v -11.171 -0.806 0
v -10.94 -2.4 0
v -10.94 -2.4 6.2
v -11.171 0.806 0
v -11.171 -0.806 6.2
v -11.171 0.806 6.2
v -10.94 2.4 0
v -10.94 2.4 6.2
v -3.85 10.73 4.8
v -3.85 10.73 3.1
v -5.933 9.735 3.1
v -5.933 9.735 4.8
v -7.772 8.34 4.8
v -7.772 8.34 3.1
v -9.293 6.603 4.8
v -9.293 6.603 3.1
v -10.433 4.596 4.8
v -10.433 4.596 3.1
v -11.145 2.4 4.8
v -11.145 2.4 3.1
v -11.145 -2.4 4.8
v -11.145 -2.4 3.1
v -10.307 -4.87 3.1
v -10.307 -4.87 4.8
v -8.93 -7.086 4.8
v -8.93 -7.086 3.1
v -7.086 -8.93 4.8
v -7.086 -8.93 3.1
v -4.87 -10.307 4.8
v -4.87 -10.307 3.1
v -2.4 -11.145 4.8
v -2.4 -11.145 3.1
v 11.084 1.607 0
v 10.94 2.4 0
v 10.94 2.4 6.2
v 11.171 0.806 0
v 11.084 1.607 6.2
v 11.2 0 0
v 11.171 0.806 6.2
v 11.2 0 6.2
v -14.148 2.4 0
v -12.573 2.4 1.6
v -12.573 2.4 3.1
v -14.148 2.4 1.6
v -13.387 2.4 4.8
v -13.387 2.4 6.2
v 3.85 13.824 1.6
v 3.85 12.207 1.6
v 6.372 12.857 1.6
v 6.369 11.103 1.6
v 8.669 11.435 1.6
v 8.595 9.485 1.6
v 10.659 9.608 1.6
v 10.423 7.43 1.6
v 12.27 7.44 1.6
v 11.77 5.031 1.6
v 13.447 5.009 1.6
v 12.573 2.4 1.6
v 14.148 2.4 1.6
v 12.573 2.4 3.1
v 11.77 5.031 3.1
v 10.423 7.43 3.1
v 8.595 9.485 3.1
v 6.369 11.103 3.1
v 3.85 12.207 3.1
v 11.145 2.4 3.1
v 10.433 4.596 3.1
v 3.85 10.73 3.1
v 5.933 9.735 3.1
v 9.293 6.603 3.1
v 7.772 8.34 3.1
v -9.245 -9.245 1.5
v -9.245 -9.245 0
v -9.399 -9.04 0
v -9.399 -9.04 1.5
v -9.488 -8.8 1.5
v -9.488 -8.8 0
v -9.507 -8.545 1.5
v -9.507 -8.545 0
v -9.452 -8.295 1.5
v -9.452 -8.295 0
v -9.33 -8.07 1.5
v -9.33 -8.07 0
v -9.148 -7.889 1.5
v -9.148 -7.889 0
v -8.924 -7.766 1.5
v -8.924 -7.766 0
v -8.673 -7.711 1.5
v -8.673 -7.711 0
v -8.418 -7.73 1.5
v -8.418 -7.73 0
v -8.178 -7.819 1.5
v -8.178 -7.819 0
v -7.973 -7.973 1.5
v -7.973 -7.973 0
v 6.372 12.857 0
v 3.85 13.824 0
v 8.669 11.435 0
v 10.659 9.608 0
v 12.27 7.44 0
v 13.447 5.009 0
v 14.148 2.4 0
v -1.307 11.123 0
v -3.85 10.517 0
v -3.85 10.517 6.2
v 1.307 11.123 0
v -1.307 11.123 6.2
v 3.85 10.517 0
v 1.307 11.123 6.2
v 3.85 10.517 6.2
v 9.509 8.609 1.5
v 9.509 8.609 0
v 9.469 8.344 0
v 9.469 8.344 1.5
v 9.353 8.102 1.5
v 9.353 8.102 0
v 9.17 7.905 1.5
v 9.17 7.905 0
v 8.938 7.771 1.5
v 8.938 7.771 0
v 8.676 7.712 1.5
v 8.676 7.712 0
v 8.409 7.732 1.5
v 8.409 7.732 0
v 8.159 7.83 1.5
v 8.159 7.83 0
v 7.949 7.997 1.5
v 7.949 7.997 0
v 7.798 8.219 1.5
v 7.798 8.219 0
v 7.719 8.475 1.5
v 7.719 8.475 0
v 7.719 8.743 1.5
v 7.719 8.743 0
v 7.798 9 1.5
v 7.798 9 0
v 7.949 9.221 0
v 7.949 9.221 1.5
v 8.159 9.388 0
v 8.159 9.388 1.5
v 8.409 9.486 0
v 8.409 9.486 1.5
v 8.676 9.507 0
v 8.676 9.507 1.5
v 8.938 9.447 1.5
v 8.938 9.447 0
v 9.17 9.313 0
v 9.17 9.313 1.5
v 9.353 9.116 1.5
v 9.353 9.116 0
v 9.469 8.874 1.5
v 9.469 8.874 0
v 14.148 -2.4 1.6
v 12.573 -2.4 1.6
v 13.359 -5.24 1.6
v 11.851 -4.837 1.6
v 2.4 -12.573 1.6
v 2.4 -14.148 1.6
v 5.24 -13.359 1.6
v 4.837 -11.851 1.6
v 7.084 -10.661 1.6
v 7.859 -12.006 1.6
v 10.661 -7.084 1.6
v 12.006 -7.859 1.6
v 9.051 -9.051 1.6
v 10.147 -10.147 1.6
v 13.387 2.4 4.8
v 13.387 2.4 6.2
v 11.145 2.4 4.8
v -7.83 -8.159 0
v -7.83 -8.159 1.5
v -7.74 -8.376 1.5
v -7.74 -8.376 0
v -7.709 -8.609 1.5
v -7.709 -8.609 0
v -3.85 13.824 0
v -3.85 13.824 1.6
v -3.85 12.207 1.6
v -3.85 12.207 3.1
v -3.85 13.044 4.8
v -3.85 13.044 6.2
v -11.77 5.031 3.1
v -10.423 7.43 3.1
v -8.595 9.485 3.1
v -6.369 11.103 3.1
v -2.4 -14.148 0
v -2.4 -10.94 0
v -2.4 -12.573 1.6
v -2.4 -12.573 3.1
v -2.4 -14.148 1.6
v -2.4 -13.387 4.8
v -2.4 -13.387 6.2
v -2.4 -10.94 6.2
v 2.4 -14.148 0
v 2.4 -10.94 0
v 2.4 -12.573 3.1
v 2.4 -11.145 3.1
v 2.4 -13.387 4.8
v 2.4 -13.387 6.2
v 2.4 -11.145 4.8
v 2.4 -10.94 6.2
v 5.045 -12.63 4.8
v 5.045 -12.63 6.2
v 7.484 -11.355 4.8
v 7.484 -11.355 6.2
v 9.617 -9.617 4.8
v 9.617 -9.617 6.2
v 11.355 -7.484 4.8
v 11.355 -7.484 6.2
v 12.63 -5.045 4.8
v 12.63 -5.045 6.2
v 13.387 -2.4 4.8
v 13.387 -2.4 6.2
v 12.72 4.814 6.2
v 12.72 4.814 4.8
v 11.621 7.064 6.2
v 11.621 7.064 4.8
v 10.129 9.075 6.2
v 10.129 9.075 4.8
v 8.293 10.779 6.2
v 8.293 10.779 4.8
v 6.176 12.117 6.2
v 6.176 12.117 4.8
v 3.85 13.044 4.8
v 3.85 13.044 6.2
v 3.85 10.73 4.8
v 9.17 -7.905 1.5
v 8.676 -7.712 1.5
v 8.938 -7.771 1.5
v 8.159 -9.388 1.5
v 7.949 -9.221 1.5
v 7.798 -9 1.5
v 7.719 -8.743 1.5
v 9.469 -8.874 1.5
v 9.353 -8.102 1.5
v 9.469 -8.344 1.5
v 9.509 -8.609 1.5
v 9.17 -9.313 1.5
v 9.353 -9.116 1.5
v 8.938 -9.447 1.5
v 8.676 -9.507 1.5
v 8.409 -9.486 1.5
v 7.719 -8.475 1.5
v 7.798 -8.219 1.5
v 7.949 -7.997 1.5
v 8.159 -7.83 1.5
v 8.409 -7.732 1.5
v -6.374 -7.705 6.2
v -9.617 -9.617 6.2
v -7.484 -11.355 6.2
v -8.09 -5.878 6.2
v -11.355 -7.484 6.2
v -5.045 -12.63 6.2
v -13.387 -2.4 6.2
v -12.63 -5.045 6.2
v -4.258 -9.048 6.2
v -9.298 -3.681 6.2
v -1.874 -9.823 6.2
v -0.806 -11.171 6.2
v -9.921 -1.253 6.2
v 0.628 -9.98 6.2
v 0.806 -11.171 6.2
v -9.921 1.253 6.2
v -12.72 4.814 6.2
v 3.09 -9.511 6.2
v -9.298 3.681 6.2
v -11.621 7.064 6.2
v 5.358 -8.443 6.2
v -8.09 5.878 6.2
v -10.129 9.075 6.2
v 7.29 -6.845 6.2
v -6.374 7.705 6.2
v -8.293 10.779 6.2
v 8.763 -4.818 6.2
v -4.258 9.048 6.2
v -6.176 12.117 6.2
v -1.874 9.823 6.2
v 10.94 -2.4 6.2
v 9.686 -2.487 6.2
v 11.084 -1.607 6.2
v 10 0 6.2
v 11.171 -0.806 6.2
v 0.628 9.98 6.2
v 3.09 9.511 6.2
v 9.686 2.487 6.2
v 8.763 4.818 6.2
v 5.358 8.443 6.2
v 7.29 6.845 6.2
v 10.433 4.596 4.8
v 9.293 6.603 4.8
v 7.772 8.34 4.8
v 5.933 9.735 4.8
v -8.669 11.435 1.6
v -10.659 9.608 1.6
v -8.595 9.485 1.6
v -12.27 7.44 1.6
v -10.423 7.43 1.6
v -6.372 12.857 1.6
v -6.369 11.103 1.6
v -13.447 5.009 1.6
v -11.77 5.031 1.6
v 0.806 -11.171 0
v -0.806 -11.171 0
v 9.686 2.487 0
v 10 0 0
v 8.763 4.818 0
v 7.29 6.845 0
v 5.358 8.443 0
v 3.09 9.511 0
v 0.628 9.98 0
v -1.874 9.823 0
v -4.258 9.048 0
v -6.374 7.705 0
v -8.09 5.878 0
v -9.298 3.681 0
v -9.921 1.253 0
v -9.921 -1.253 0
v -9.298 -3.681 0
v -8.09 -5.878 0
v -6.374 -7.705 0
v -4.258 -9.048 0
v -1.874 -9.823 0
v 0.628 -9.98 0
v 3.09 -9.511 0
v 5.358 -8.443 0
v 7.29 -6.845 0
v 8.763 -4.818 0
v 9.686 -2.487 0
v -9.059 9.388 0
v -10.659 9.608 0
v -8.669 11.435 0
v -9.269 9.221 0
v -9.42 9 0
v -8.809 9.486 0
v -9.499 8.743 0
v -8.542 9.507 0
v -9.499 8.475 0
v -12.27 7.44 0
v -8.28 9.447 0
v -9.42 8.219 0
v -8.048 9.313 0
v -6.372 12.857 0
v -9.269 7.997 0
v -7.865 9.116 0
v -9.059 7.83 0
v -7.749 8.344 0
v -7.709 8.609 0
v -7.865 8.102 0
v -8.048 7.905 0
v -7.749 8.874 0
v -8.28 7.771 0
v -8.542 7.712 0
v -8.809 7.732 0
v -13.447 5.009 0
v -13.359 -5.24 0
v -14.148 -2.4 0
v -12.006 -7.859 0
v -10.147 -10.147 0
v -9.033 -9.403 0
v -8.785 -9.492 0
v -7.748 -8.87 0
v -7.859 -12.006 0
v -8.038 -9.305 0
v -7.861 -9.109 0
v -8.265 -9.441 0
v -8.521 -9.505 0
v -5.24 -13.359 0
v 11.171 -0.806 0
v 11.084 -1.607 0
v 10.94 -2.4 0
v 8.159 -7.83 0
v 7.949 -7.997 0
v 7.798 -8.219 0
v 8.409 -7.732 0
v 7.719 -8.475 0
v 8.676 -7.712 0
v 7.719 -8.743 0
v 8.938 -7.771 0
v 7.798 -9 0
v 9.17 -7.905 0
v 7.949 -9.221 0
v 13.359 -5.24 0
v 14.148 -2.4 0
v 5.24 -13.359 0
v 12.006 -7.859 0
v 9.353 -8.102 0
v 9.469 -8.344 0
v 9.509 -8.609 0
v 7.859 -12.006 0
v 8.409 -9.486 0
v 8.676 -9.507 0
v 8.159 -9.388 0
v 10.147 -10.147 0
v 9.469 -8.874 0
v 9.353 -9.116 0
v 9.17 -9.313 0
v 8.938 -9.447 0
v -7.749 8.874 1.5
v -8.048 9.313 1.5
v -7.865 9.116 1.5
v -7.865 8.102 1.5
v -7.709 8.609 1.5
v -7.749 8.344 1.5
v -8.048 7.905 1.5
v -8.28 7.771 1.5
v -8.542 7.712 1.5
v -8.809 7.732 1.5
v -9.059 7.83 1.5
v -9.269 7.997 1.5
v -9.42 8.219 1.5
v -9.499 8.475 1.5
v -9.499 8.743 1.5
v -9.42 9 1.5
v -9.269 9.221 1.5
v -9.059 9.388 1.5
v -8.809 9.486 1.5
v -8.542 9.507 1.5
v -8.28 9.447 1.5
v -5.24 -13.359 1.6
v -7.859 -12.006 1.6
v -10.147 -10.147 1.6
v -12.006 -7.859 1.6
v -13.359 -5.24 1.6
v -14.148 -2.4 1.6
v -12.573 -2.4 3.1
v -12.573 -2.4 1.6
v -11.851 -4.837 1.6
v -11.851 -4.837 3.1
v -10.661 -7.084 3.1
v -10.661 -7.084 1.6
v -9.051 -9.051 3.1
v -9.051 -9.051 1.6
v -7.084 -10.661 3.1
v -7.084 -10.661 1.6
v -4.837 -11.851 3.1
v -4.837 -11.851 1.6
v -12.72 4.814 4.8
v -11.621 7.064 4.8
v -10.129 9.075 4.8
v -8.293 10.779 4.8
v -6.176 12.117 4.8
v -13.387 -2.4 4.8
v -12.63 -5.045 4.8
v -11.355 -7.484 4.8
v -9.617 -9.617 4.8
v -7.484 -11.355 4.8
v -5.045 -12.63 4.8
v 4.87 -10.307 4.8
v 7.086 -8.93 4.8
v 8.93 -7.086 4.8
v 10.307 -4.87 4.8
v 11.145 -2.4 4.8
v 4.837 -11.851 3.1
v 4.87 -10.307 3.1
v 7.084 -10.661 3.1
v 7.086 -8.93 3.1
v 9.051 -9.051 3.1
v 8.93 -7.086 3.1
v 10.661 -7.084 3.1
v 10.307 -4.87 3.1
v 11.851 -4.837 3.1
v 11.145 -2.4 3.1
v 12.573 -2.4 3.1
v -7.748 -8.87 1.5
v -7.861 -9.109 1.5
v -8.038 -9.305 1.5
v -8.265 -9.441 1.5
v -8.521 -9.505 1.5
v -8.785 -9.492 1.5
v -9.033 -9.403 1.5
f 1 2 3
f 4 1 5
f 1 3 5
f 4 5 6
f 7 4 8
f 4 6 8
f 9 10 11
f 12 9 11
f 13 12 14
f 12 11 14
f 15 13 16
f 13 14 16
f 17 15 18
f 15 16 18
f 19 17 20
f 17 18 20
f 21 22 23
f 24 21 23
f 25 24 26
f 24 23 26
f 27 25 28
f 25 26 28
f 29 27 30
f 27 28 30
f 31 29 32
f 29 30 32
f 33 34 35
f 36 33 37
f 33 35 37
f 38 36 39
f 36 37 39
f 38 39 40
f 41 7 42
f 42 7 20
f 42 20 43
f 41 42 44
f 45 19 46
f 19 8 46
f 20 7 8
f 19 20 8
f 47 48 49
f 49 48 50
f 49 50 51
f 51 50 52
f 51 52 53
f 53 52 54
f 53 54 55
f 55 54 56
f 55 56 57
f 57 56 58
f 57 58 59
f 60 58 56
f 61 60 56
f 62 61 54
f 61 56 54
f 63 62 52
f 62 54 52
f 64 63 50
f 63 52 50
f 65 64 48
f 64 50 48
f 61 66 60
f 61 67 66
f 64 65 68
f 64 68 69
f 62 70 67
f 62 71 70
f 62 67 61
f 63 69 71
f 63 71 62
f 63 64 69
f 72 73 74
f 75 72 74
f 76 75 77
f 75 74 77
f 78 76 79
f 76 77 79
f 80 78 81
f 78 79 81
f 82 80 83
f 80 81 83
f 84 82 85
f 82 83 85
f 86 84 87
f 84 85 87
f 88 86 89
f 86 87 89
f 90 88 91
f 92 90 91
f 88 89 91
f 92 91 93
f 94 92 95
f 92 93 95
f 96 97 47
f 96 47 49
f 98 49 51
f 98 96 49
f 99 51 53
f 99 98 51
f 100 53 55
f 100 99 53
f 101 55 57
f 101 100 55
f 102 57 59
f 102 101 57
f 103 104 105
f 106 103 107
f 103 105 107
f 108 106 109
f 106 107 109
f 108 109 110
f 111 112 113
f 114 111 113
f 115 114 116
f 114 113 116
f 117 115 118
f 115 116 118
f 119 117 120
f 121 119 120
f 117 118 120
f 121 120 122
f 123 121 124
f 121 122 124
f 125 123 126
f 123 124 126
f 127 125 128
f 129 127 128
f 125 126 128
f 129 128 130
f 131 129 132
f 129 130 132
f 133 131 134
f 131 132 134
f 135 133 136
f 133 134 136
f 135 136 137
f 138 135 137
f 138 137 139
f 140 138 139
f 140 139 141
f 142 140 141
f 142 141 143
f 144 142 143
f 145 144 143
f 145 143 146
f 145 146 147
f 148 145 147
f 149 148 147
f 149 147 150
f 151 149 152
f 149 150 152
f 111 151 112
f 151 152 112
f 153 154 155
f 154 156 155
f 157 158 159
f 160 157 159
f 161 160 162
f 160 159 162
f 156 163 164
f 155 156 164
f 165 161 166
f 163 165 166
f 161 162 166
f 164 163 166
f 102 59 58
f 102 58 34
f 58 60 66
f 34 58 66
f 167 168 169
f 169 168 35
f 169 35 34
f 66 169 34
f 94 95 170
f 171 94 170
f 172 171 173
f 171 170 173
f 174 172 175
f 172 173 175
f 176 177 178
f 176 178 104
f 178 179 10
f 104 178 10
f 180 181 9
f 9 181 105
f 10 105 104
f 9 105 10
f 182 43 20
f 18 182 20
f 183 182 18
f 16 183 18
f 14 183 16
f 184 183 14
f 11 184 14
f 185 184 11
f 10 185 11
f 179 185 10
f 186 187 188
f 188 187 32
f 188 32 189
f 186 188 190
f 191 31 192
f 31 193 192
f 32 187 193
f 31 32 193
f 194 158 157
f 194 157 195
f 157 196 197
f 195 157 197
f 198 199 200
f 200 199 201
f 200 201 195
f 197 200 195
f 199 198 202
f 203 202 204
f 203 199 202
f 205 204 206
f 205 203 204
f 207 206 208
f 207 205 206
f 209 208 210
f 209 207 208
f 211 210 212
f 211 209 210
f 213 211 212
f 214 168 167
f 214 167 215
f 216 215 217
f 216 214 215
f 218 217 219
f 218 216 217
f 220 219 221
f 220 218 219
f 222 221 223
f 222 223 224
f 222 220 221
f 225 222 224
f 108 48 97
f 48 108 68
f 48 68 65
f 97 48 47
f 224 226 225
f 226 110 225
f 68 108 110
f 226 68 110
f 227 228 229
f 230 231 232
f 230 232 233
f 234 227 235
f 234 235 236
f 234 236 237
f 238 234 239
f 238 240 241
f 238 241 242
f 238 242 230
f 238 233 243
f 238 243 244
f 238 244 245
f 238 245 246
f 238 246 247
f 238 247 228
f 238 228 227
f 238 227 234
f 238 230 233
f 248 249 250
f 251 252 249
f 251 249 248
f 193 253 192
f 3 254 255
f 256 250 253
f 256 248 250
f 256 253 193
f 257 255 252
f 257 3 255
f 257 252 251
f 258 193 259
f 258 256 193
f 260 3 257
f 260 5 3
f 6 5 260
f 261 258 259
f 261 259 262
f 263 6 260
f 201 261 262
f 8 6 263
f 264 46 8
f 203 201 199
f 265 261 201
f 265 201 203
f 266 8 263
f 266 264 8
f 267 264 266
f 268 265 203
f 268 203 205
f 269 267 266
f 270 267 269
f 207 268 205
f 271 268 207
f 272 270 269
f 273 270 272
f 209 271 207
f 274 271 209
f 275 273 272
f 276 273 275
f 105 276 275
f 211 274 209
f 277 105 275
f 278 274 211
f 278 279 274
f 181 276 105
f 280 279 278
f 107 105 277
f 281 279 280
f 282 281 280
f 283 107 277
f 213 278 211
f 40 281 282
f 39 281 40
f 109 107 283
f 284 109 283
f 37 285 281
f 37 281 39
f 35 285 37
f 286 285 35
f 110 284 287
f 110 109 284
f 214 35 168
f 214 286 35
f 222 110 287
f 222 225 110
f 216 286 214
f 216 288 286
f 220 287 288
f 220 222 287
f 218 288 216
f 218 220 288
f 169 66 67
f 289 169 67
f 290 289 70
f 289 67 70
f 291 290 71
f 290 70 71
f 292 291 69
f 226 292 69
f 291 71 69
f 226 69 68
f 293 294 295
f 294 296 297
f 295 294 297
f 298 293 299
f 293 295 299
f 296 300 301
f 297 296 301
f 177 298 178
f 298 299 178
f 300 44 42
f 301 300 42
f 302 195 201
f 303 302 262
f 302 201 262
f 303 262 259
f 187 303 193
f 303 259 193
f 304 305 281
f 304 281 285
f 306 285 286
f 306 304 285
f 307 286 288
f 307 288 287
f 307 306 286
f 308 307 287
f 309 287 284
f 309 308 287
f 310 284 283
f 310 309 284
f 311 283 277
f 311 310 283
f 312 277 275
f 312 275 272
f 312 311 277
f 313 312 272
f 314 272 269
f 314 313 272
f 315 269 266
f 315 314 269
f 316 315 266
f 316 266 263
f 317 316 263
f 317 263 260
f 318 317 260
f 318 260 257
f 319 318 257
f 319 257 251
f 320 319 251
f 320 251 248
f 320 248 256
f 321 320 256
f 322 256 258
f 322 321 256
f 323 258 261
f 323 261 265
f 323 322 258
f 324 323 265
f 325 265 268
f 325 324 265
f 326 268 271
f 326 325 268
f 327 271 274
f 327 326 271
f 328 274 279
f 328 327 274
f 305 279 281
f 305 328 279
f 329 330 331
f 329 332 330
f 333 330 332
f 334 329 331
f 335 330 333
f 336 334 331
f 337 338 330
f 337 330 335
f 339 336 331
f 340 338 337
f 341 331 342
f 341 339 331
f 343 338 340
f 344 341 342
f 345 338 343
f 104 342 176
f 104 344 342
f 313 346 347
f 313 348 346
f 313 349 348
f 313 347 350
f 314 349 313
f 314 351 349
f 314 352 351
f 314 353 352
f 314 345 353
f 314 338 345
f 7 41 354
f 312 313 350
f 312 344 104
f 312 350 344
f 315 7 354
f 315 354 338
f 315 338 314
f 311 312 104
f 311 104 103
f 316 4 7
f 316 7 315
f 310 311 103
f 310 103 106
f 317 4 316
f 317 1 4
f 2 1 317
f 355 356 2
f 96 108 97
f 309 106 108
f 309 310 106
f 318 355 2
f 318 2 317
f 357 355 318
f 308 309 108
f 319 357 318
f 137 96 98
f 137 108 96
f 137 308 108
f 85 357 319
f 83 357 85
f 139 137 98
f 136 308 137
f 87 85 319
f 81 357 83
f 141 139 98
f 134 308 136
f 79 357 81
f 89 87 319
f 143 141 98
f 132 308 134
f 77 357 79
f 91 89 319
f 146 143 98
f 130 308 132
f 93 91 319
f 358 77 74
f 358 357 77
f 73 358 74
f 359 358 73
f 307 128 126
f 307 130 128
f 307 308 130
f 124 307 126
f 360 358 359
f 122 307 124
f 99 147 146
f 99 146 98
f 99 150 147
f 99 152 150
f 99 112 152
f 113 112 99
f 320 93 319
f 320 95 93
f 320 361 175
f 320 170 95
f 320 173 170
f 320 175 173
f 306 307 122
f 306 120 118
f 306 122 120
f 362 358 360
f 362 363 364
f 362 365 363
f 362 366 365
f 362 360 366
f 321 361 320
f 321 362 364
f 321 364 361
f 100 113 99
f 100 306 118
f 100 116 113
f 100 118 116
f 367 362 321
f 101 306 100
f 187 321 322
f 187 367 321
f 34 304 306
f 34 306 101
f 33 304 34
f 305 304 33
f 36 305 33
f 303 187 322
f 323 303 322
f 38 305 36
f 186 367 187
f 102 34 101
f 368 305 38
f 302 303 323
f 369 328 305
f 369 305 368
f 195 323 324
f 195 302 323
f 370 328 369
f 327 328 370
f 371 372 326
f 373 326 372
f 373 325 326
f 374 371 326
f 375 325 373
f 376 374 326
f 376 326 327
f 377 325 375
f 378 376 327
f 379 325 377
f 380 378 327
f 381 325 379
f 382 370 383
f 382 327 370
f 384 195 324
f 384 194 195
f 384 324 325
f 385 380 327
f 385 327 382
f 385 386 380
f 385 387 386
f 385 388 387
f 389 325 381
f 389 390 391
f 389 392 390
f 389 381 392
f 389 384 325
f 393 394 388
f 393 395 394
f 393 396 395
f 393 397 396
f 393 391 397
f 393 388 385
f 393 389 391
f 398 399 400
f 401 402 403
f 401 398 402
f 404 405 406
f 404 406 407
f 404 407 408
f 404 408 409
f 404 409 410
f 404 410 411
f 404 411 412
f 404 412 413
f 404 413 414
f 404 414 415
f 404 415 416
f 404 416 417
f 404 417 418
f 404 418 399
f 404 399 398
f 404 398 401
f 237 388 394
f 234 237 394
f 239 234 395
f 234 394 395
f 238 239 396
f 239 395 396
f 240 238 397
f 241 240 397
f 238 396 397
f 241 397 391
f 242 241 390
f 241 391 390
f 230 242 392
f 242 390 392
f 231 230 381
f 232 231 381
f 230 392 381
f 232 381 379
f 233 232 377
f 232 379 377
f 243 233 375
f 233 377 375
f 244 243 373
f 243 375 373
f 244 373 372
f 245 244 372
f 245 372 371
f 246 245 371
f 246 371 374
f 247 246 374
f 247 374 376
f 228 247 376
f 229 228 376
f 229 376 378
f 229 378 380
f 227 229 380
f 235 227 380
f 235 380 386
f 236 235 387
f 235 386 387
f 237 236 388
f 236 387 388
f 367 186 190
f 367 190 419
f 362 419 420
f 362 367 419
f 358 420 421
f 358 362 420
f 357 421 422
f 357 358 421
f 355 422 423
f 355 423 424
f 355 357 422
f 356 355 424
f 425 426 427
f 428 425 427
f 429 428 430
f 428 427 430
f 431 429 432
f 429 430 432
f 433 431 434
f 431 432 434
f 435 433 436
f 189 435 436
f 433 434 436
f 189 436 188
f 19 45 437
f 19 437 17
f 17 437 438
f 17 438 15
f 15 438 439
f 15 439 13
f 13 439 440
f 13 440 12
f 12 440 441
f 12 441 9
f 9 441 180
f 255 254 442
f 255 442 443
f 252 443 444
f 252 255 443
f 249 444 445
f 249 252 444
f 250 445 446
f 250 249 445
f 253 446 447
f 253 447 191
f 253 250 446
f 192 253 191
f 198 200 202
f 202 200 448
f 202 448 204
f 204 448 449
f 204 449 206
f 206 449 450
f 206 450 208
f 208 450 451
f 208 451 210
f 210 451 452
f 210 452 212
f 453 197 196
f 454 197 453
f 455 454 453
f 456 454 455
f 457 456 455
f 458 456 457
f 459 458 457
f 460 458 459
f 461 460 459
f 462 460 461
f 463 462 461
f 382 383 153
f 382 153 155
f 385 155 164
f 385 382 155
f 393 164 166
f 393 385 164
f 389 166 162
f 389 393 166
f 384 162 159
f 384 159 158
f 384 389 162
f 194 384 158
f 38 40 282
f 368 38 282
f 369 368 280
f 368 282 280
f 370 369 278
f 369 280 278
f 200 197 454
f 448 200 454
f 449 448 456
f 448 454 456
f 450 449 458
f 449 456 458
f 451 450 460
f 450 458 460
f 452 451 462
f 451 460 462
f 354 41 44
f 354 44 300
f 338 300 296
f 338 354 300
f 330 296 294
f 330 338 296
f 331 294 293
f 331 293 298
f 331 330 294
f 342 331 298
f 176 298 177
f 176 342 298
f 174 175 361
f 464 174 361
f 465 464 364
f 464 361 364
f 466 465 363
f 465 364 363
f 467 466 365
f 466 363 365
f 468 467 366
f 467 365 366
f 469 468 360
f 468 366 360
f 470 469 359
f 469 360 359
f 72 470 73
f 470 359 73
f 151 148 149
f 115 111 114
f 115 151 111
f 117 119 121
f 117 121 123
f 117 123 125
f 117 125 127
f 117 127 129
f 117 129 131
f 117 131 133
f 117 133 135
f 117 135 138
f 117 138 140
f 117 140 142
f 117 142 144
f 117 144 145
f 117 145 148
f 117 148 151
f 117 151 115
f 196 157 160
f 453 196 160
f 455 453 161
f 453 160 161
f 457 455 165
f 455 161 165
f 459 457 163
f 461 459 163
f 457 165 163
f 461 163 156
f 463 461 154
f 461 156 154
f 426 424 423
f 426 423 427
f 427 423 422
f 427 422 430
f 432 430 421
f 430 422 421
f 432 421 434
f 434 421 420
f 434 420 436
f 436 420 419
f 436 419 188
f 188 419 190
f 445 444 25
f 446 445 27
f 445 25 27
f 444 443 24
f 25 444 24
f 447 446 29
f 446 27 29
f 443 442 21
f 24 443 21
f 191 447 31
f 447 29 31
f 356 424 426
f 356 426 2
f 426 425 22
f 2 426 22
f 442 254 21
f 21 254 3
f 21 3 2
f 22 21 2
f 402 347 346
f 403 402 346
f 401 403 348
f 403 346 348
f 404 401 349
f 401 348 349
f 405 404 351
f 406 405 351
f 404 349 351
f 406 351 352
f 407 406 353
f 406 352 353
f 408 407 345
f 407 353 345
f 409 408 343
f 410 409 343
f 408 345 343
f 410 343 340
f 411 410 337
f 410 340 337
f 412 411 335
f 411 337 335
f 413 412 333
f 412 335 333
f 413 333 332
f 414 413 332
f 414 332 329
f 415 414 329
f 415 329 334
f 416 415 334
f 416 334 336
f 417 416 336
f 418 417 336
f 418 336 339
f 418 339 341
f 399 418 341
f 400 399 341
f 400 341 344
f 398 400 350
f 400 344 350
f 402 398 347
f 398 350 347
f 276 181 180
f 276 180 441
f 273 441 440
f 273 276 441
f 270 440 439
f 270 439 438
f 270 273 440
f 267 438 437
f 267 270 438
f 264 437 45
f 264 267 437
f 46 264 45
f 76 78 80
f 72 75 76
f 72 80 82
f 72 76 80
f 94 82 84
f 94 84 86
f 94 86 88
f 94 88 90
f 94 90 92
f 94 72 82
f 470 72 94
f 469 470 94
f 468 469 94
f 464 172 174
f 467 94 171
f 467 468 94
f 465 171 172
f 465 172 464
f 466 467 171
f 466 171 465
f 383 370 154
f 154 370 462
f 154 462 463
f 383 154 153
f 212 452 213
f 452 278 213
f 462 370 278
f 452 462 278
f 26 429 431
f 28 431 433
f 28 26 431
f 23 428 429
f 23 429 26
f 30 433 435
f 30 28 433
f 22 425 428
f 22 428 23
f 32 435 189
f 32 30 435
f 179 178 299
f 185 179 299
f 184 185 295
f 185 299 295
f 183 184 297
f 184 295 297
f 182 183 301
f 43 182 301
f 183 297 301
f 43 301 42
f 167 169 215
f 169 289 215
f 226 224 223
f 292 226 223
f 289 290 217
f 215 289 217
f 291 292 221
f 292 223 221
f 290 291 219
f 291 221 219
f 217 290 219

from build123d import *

# Parameters (mm, degrees)
F0_R      = 11.4
F0_R_2    = 10
F1_DEPTH  = 6.2
F2_R      = 13.6
F2_R_2    = 11.4
F3_DEPTH  = 1.4
F4_R      = 14.35
F4_R_2    = 11.4
F5_DEPTH  = 1.6
F6_R      = 12.8
F6_R_2    = 11.4
F7_DEPTH  = 1.5
F9_DEPTH  = 25
F10_R     = 0.9
F11_DEPTH = 1.5


with BuildPart() as f1:
    # F0 (on Top) → F1 (new body)
    with BuildSketch(Plane.XY):
        Circle(F0_R)
        Circle(F0_R_2, mode=Mode.SUBTRACT)
    extrude(amount=F1_DEPTH)

    # F2 (on face) → F3 (join)
    with BuildSketch(Plane.XY.offset(6.2)):
        Circle(F2_R)
        Circle(F2_R_2, mode=Mode.SUBTRACT)
    extrude(amount=-F3_DEPTH)

    # F4 (on face) → F5 (join)
    with BuildSketch(Plane(origin=(0, 0, 0), x_dir=(1, 0, 0), z_dir=(0, 0, -1))):
        Circle(F4_R)
        Circle(F4_R_2, mode=Mode.SUBTRACT)
    extrude(amount=-F5_DEPTH)

    # F6 (on face) → F7 (join)
    with BuildSketch(Plane.XY.offset(1.6)):
        Circle(F6_R)
        Circle(F6_R_2, mode=Mode.SUBTRACT)
    extrude(amount=F7_DEPTH)

    # F8 (on face) → F9 (cut)
    with BuildSketch(Plane.XY.offset(6.2)):
        with BuildLine():
            ThreePointArc((-3.85, 10.5174854409), (0, 11.2), (3.85, 10.5174854409))
            Line((3.85, 10.5174854409), (3.85, 11.2))
            Line((3.85, 11.2), (3.85, 13.0436766289))
            ThreePointArc((3.85, 13.0436766289), (0, 13.6), (-3.85, 13.0436766289))
            Line((-3.85, 13.0436766289), (-3.85, 11.2))
            Line((-3.85, 11.2), (-3.85, 10.5174854409))
        make_face()
        with BuildLine():
            ThreePointArc((-3.85, 13.0436766289), (0, 13.6), (3.85, 13.0436766289))
            Line((3.85, 13.0436766289), (3.85, 16.0734057426))
            Line((3.85, 16.0734057426), (-3.85, 16.0734057426))
            Line((-3.85, 16.0734057426), (-3.85, 13.0436766289))
        make_face()
        with BuildLine():
            ThreePointArc((-13.3865604245, -2.4), (-13.6, 0), (-13.3865604245, 2.4))
            Line((-13.3865604245, 2.4), (-16.2201337516, 2.4))
            Line((-16.2201337516, 2.4), (-16.2201337516, -2.4))
            Line((-16.2201337516, -2.4), (-13.3865604245, -2.4))
        make_face()
        with BuildLine():
            ThreePointArc((-10.9398354649, -2.4), (-11.2, 0), (-10.9398354649, 2.4))
            Line((-10.9398354649, 2.4), (-11.2, 2.4))
            Line((-11.2, 2.4), (-13.3865604245, 2.4))
            ThreePointArc((-13.3865604245, 2.4), (-13.6, 0), (-13.3865604245, -2.4))
            Line((-13.3865604245, -2.4), (-11.2, -2.4))
            Line((-11.2, -2.4), (-10.9398354649, -2.4))
        make_face()
        with BuildLine():
            ThreePointArc((10.9398354649, 2.4), (11.1347689066, 1.2070299898), (11.2, 0))
            ThreePointArc((11.2, 0), (11.1347689066, -1.2070299898), (10.9398354649, -2.4))
            Line((10.9398354649, -2.4), (11.2, -2.4))
            Line((11.2, -2.4), (13.3865604245, -2.4))
            ThreePointArc((13.3865604245, -2.4), (13.5465350141, -1.2047361176), (13.6, 0))
            ThreePointArc((13.6, 0), (13.5465350141, 1.2047361176), (13.3865604245, 2.4))
            Line((13.3865604245, 2.4), (11.2, 2.4))
            Line((11.2, 2.4), (10.9398354649, 2.4))
        make_face()
        with BuildLine():
            Line((16.2201337516, 2.4), (13.3865604245, 2.4))
            ThreePointArc((13.3865604245, 2.4), (13.5465350141, 1.2047361176), (13.6, 0))
            ThreePointArc((13.6, 0), (13.5465350141, -1.2047361176), (13.3865604245, -2.4))
            Line((13.3865604245, -2.4), (16.2201337516, -2.4))
            Line((16.2201337516, -2.4), (16.2201337516, 2.4))
        make_face()
        with BuildLine():
            Line((2.4, -11.2), (2.4, -10.9398354649))
            ThreePointArc((2.4, -10.9398354649), (0, -11.2), (-2.4, -10.9398354649))
            Line((-2.4, -10.9398354649), (-2.4, -11.2))
            Line((-2.4, -11.2), (-2.4, -13.3865604245))
            ThreePointArc((-2.4, -13.3865604245), (0, -13.6), (2.4, -13.3865604245))
            Line((2.4, -13.3865604245), (2.4, -11.2))
        make_face()
        with BuildLine():
            Line((2.4, -15.2210220695), (2.4, -13.3865604245))
            ThreePointArc((2.4, -13.3865604245), (0, -13.6), (-2.4, -13.3865604245))
            Line((-2.4, -13.3865604245), (-2.4, -15.2210220695))
            Line((-2.4, -15.2210220695), (2.4, -15.2210220695))
        make_face()
    extrude(amount=-F9_DEPTH, mode=Mode.SUBTRACT)

    # F10 (on face) → F11 (cut)
    with BuildSketch(Plane(origin=(0, 0, 0), x_dir=(1, 0, 0), z_dir=(0, 0, -1))):
        with BuildLine():
            ThreePointArc((-7.7090250609, 8.6090250609), (-8.2646099718, 9.4405166402), (-9.245421164, 9.245421164))
            Line((-9.245421164, 9.245421164), (-7.9726289579, 7.9726289579))
            ThreePointArc((-7.9726289579, 7.9726289579), (-7.7775334817, 8.2646099718), (-7.7090250609, 8.6090250609))
        make_face()
        with BuildLine():
            Line((-7.9726289579, 7.9726289579), (-9.245421164, 9.245421164))
            ThreePointArc((-9.245421164, 9.245421164), (-9.245421164, 7.9726289579), (-7.9726289579, 7.9726289579))
        make_face()
        with Locations((8.6090250609, 8.6090250609)):
            Circle(F10_R)
        with Locations((8.6090250609, -8.6090250609)):
            Circle(F10_R)
        with Locations((-8.6090250609, -8.6090250609)):
            Circle(F10_R)
    extrude(amount=-F11_DEPTH, mode=Mode.SUBTRACT)


solid = f1.part
